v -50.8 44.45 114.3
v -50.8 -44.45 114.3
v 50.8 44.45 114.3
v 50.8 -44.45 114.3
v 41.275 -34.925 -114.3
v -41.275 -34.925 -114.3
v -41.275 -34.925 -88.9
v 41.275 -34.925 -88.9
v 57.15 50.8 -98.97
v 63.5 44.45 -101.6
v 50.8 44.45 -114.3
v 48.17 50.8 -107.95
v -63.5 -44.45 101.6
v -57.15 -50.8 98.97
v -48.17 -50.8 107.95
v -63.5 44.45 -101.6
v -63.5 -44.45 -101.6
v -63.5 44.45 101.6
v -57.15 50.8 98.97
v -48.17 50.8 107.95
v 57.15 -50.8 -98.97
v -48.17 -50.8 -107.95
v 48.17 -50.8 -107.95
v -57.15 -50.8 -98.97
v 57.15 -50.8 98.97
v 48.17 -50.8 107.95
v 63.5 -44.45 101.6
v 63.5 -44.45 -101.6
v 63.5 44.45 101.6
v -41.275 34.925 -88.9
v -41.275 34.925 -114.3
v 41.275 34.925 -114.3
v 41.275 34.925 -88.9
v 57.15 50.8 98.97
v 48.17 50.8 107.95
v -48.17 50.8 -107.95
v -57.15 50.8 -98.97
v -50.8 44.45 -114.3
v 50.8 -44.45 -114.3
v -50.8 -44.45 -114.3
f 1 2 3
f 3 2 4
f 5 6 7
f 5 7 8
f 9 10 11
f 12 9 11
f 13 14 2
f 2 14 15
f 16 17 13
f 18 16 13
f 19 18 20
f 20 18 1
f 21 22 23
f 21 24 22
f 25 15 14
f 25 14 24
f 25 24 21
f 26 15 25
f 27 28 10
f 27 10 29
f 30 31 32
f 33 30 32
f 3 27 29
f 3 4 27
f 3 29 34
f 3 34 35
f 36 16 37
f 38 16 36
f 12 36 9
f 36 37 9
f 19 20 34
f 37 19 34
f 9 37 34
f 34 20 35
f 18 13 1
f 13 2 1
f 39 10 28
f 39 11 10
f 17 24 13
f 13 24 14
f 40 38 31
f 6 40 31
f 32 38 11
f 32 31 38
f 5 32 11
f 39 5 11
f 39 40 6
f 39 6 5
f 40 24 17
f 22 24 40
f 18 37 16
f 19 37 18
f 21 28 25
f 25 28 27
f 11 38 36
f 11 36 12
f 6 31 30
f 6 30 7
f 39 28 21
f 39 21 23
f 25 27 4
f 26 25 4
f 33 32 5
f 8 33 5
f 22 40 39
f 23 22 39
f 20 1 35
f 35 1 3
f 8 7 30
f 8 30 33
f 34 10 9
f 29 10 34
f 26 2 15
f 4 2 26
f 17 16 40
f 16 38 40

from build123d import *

# Parameters (mm, degrees)
F0_W     = 127
F0_H     = 228.6
F1_DEPTH = 50.8
F2_SIZE  = 12.7
F3_SIZE  = 6.35
F4_W     = 82.55
F4_H     = 69.85
F5_DEPTH = 25.4


with BuildPart() as f1:
    # F0 (on Front) → F1 (new body, symmetric)
    with BuildSketch(Plane.XZ):
        Rectangle(F0_W, F0_H)
    extrude(amount=F1_DEPTH, both=True)

    # F2
    f2_edges = [f1.edges().sort_by_distance(p)[0] for p in [
        (-63.5, 0, 114.3),
        (63.5, 0, 114.3),
        (63.5, 0, -114.3),
        (-63.5, 0, -114.3),
    ]]
    chamfer(f2_edges, length=F2_SIZE)

    # F3
    f3_edges = [f1.edges().sort_by_distance(p)[0] for p in [
        (0, -50.8, -114.3),
        (-57.15, -50.8, -107.95),
        (57.15, -50.8, -107.95),
        (-63.5, -50.8, 0),
        (63.5, -50.8, 0),
        (-57.15, -50.8, 107.95),
        (57.15, -50.8, 107.95),
        (0, -50.8, 114.3),
        (0, 50.8, -114.3),
        (-57.15, 50.8, -107.95),
        (57.15, 50.8, -107.95),
        (-63.5, 50.8, 0),
        (63.5, 50.8, 0),
        (-57.15, 50.8, 107.95),
        (57.15, 50.8, 107.95),
        (0, 50.8, 114.3),
    ]]
    chamfer(f3_edges, length=F3_SIZE)

    # F4 (on face) → F5 (cut)
    with BuildSketch(Plane(origin=(0, 0, -114.3), x_dir=(1, 0, 0), z_dir=(0, 0, -1))):
        Rectangle(F4_W, F4_H)
    extrude(amount=-F5_DEPTH, mode=Mode.SUBTRACT)


solid = f1.part
